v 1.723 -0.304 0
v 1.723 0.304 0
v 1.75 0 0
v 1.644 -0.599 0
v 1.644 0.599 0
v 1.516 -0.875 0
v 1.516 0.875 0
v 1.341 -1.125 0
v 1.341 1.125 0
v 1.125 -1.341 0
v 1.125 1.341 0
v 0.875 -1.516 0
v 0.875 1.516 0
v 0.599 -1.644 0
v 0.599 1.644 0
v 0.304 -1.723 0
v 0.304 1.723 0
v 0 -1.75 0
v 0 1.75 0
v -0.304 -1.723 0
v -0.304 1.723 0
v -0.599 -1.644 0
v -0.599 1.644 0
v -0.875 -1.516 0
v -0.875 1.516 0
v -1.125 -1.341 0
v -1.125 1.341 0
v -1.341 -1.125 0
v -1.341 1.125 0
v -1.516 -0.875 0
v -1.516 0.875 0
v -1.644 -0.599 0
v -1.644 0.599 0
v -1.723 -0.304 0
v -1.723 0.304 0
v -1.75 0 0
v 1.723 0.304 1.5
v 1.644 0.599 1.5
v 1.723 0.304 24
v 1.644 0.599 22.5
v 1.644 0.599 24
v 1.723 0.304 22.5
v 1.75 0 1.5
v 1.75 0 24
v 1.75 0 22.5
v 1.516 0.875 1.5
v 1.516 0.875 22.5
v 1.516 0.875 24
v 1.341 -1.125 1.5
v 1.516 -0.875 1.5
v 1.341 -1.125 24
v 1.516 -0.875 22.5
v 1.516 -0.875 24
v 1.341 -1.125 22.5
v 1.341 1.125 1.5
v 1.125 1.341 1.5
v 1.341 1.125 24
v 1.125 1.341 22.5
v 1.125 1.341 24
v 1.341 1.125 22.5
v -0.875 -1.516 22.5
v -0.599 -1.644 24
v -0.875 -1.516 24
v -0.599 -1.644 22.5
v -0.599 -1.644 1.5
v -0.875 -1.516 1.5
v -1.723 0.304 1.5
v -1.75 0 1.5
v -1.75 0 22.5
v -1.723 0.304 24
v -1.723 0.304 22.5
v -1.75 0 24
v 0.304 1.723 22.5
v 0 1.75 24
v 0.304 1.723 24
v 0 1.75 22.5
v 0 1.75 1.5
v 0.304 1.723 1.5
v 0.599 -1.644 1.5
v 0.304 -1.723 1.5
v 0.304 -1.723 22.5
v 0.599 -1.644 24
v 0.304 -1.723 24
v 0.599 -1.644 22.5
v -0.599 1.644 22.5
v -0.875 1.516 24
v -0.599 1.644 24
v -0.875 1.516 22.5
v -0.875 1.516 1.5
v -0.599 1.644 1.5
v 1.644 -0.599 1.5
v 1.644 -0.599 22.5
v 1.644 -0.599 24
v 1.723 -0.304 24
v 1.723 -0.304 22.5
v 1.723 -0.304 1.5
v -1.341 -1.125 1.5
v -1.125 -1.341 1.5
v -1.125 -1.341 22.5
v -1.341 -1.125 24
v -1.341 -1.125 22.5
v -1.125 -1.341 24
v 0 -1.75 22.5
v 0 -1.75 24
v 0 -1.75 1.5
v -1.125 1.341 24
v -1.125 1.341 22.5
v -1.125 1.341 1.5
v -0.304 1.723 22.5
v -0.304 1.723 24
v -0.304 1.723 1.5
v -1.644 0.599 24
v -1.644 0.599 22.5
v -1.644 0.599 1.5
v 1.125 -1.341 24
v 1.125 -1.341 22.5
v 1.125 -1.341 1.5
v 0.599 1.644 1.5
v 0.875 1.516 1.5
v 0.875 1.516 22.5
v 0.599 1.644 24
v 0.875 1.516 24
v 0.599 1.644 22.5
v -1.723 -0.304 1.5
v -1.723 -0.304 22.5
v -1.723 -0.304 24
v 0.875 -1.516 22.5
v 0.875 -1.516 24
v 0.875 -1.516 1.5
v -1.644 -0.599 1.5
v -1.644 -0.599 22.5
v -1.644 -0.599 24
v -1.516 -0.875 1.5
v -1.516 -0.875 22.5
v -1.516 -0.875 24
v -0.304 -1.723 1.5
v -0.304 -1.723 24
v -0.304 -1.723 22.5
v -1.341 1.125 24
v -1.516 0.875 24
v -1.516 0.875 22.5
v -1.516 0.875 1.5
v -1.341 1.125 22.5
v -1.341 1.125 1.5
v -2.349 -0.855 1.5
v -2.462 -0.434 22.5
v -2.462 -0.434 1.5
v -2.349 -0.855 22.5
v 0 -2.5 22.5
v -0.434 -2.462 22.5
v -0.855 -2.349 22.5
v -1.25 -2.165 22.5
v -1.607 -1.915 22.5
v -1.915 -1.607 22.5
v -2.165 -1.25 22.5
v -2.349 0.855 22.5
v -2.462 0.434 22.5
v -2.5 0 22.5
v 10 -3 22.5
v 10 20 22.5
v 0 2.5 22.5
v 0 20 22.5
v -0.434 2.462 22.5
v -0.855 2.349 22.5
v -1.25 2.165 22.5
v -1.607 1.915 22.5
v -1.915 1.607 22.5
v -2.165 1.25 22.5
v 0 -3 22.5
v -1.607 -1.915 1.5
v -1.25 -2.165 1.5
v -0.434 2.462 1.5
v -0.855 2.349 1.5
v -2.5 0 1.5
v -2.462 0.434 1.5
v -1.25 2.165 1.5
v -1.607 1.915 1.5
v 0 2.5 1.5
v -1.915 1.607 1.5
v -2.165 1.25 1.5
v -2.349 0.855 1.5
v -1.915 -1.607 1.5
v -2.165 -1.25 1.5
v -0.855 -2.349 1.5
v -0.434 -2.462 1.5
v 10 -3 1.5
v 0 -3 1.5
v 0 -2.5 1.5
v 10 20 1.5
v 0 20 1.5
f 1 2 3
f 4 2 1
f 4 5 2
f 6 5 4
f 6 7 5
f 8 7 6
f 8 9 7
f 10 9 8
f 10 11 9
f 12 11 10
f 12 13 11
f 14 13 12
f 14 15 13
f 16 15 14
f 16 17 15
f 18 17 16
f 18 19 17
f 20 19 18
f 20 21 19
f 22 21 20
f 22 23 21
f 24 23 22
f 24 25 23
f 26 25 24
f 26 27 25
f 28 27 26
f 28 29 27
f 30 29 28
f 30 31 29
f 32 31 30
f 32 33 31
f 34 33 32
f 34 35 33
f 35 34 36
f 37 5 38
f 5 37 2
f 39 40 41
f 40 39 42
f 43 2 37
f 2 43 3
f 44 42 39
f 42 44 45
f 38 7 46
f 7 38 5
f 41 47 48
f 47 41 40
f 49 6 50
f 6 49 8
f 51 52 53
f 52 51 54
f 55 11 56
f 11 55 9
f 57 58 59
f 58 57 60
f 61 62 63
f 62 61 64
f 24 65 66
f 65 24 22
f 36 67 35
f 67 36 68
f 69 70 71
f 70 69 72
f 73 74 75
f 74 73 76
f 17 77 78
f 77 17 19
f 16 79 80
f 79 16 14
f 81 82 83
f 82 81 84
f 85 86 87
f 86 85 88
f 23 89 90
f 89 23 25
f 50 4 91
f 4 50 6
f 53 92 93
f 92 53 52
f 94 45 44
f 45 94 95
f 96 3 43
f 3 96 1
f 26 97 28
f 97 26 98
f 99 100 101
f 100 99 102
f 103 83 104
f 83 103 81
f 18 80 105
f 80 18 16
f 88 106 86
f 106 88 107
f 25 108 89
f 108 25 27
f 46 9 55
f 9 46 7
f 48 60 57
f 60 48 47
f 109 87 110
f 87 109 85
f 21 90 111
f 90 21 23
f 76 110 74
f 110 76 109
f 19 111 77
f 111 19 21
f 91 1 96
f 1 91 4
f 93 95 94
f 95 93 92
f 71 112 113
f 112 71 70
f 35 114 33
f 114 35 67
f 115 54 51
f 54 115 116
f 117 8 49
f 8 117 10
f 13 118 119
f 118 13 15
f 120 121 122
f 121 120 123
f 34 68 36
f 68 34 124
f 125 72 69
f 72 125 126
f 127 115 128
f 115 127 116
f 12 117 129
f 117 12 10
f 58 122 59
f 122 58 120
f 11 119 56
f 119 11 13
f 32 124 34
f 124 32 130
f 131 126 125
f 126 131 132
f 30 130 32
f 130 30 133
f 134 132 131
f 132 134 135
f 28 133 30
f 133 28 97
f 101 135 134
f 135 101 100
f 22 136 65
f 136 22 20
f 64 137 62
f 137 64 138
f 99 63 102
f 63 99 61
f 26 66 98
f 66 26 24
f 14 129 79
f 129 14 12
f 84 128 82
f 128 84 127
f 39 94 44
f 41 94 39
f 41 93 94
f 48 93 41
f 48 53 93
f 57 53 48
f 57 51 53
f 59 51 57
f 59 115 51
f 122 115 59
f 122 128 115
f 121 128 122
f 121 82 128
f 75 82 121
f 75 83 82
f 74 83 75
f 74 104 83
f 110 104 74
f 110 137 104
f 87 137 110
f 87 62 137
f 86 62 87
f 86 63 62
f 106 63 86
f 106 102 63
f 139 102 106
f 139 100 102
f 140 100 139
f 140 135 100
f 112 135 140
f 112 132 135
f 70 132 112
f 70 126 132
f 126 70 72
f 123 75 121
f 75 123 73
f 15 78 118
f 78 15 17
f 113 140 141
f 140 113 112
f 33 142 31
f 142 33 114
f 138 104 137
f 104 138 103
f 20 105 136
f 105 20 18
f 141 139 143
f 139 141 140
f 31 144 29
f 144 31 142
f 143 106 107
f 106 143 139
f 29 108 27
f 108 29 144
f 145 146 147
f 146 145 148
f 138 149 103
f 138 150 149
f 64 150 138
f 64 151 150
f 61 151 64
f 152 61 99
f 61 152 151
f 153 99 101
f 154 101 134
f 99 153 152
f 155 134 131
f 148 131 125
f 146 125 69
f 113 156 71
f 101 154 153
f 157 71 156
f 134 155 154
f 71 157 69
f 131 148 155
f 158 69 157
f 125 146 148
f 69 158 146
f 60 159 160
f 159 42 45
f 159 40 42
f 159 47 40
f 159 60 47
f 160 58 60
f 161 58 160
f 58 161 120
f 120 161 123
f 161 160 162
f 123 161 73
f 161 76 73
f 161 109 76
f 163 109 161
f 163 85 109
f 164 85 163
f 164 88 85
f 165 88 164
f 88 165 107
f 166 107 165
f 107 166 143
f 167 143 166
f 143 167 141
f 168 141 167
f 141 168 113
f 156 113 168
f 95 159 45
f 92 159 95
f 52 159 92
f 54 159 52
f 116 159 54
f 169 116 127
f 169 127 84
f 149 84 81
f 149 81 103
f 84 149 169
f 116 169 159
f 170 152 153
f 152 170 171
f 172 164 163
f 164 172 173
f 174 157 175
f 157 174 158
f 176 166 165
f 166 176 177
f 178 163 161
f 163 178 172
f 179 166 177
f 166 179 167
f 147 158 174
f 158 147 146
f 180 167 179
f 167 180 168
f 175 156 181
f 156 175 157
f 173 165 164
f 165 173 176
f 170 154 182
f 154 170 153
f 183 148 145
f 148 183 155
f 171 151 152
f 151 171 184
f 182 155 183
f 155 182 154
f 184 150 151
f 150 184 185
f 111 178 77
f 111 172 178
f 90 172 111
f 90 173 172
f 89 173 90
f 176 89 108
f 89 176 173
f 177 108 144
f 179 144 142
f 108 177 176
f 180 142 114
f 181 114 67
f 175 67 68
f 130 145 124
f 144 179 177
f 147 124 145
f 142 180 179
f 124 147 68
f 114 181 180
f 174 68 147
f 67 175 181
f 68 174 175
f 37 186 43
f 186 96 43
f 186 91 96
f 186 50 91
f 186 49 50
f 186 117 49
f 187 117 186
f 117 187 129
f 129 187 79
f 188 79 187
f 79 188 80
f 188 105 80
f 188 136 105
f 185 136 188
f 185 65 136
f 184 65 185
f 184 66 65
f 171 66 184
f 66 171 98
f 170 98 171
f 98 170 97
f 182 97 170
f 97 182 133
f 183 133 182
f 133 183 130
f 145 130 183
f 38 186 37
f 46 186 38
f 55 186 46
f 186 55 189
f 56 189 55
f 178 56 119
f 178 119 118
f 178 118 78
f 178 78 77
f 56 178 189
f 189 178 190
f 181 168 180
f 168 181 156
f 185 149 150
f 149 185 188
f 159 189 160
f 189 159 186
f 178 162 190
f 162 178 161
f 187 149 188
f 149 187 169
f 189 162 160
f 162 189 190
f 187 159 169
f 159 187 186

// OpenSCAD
//---------------------------------------------------------------------------------------------
//-- Printable feet for Logitech keyboard
//-- (c) Martin Korinek	m.ko@inode.at
//-- March-2015
//---------------------------------------------------------------------------------------------
//--
//---------------------------------------------------------------------------------------------

//fragment minimum angle
  $fa=10.0;

//fragment minimum size
  $fs=0.2;
  
	cylinder(h = 24, d = 3.5);
	translate([0,0,1.5])cylinder(h = 21, d = 5);
	translate([0,-3,1.5])	cube([10,23,21]);
 
